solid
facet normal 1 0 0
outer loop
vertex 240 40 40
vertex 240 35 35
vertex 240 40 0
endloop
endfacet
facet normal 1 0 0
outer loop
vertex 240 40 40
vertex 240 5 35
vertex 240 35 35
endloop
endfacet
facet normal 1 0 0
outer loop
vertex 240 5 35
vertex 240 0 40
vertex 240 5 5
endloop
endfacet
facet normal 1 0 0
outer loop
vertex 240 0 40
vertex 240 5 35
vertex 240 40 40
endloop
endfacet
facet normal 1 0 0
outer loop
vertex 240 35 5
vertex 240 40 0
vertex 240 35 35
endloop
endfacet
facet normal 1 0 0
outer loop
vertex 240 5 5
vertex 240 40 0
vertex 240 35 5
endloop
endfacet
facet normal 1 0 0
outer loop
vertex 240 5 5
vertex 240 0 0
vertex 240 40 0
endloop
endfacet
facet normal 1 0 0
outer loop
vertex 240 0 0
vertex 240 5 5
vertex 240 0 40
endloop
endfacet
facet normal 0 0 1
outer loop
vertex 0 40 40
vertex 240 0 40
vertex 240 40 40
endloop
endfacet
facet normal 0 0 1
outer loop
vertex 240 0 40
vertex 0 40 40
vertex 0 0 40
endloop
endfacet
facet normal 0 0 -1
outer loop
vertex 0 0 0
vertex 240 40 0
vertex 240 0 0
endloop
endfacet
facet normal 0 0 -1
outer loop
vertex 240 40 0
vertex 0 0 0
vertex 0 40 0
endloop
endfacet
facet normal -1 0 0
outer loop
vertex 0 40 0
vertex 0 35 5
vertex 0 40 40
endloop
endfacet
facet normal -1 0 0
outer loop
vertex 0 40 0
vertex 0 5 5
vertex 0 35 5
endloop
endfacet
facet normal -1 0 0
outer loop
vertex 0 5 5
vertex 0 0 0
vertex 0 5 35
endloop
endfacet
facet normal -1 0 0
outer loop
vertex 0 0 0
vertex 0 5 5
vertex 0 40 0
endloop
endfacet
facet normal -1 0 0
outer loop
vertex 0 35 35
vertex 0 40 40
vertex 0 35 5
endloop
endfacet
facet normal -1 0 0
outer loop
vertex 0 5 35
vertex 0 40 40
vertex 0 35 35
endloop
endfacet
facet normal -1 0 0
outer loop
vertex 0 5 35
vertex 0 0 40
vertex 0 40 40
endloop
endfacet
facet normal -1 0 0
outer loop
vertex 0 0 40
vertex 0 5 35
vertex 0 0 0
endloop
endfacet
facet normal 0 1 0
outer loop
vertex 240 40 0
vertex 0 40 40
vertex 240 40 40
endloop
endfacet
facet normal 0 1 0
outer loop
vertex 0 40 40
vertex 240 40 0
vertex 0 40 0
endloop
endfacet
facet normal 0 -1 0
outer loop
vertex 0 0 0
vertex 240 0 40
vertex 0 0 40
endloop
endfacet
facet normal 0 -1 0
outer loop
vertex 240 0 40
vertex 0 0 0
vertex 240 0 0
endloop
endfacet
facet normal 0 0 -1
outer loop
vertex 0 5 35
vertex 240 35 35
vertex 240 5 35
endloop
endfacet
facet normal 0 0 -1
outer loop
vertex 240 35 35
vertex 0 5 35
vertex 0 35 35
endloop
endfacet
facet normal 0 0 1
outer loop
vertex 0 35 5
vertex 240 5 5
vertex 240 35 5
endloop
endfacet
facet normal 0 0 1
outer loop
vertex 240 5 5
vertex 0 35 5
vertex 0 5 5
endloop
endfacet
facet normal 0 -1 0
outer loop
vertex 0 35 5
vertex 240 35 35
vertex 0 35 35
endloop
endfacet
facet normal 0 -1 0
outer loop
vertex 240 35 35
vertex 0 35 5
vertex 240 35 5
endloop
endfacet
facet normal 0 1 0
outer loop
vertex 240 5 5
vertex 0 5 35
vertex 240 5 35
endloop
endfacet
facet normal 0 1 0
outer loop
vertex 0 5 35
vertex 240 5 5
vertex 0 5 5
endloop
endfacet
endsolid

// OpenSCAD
$fn = 32;

// ----------------------------------------------------------------------
// Box beam: 200-250 mm hollow beam
// ----------------------------------------------------------------------

// --- parameters (mm) ---
beam_l = 240;             // beam length, X
beam_w = 40;              // beam width, Y
beam_h = 40;              // beam height, Z
wall = 5;                 // wall thickness

difference() {
  cube([beam_l, beam_w, beam_h]);
  translate([-1, wall, wall])
    cube([beam_l + 2, beam_w - 2 * wall, beam_h - 2 * wall]);
}
